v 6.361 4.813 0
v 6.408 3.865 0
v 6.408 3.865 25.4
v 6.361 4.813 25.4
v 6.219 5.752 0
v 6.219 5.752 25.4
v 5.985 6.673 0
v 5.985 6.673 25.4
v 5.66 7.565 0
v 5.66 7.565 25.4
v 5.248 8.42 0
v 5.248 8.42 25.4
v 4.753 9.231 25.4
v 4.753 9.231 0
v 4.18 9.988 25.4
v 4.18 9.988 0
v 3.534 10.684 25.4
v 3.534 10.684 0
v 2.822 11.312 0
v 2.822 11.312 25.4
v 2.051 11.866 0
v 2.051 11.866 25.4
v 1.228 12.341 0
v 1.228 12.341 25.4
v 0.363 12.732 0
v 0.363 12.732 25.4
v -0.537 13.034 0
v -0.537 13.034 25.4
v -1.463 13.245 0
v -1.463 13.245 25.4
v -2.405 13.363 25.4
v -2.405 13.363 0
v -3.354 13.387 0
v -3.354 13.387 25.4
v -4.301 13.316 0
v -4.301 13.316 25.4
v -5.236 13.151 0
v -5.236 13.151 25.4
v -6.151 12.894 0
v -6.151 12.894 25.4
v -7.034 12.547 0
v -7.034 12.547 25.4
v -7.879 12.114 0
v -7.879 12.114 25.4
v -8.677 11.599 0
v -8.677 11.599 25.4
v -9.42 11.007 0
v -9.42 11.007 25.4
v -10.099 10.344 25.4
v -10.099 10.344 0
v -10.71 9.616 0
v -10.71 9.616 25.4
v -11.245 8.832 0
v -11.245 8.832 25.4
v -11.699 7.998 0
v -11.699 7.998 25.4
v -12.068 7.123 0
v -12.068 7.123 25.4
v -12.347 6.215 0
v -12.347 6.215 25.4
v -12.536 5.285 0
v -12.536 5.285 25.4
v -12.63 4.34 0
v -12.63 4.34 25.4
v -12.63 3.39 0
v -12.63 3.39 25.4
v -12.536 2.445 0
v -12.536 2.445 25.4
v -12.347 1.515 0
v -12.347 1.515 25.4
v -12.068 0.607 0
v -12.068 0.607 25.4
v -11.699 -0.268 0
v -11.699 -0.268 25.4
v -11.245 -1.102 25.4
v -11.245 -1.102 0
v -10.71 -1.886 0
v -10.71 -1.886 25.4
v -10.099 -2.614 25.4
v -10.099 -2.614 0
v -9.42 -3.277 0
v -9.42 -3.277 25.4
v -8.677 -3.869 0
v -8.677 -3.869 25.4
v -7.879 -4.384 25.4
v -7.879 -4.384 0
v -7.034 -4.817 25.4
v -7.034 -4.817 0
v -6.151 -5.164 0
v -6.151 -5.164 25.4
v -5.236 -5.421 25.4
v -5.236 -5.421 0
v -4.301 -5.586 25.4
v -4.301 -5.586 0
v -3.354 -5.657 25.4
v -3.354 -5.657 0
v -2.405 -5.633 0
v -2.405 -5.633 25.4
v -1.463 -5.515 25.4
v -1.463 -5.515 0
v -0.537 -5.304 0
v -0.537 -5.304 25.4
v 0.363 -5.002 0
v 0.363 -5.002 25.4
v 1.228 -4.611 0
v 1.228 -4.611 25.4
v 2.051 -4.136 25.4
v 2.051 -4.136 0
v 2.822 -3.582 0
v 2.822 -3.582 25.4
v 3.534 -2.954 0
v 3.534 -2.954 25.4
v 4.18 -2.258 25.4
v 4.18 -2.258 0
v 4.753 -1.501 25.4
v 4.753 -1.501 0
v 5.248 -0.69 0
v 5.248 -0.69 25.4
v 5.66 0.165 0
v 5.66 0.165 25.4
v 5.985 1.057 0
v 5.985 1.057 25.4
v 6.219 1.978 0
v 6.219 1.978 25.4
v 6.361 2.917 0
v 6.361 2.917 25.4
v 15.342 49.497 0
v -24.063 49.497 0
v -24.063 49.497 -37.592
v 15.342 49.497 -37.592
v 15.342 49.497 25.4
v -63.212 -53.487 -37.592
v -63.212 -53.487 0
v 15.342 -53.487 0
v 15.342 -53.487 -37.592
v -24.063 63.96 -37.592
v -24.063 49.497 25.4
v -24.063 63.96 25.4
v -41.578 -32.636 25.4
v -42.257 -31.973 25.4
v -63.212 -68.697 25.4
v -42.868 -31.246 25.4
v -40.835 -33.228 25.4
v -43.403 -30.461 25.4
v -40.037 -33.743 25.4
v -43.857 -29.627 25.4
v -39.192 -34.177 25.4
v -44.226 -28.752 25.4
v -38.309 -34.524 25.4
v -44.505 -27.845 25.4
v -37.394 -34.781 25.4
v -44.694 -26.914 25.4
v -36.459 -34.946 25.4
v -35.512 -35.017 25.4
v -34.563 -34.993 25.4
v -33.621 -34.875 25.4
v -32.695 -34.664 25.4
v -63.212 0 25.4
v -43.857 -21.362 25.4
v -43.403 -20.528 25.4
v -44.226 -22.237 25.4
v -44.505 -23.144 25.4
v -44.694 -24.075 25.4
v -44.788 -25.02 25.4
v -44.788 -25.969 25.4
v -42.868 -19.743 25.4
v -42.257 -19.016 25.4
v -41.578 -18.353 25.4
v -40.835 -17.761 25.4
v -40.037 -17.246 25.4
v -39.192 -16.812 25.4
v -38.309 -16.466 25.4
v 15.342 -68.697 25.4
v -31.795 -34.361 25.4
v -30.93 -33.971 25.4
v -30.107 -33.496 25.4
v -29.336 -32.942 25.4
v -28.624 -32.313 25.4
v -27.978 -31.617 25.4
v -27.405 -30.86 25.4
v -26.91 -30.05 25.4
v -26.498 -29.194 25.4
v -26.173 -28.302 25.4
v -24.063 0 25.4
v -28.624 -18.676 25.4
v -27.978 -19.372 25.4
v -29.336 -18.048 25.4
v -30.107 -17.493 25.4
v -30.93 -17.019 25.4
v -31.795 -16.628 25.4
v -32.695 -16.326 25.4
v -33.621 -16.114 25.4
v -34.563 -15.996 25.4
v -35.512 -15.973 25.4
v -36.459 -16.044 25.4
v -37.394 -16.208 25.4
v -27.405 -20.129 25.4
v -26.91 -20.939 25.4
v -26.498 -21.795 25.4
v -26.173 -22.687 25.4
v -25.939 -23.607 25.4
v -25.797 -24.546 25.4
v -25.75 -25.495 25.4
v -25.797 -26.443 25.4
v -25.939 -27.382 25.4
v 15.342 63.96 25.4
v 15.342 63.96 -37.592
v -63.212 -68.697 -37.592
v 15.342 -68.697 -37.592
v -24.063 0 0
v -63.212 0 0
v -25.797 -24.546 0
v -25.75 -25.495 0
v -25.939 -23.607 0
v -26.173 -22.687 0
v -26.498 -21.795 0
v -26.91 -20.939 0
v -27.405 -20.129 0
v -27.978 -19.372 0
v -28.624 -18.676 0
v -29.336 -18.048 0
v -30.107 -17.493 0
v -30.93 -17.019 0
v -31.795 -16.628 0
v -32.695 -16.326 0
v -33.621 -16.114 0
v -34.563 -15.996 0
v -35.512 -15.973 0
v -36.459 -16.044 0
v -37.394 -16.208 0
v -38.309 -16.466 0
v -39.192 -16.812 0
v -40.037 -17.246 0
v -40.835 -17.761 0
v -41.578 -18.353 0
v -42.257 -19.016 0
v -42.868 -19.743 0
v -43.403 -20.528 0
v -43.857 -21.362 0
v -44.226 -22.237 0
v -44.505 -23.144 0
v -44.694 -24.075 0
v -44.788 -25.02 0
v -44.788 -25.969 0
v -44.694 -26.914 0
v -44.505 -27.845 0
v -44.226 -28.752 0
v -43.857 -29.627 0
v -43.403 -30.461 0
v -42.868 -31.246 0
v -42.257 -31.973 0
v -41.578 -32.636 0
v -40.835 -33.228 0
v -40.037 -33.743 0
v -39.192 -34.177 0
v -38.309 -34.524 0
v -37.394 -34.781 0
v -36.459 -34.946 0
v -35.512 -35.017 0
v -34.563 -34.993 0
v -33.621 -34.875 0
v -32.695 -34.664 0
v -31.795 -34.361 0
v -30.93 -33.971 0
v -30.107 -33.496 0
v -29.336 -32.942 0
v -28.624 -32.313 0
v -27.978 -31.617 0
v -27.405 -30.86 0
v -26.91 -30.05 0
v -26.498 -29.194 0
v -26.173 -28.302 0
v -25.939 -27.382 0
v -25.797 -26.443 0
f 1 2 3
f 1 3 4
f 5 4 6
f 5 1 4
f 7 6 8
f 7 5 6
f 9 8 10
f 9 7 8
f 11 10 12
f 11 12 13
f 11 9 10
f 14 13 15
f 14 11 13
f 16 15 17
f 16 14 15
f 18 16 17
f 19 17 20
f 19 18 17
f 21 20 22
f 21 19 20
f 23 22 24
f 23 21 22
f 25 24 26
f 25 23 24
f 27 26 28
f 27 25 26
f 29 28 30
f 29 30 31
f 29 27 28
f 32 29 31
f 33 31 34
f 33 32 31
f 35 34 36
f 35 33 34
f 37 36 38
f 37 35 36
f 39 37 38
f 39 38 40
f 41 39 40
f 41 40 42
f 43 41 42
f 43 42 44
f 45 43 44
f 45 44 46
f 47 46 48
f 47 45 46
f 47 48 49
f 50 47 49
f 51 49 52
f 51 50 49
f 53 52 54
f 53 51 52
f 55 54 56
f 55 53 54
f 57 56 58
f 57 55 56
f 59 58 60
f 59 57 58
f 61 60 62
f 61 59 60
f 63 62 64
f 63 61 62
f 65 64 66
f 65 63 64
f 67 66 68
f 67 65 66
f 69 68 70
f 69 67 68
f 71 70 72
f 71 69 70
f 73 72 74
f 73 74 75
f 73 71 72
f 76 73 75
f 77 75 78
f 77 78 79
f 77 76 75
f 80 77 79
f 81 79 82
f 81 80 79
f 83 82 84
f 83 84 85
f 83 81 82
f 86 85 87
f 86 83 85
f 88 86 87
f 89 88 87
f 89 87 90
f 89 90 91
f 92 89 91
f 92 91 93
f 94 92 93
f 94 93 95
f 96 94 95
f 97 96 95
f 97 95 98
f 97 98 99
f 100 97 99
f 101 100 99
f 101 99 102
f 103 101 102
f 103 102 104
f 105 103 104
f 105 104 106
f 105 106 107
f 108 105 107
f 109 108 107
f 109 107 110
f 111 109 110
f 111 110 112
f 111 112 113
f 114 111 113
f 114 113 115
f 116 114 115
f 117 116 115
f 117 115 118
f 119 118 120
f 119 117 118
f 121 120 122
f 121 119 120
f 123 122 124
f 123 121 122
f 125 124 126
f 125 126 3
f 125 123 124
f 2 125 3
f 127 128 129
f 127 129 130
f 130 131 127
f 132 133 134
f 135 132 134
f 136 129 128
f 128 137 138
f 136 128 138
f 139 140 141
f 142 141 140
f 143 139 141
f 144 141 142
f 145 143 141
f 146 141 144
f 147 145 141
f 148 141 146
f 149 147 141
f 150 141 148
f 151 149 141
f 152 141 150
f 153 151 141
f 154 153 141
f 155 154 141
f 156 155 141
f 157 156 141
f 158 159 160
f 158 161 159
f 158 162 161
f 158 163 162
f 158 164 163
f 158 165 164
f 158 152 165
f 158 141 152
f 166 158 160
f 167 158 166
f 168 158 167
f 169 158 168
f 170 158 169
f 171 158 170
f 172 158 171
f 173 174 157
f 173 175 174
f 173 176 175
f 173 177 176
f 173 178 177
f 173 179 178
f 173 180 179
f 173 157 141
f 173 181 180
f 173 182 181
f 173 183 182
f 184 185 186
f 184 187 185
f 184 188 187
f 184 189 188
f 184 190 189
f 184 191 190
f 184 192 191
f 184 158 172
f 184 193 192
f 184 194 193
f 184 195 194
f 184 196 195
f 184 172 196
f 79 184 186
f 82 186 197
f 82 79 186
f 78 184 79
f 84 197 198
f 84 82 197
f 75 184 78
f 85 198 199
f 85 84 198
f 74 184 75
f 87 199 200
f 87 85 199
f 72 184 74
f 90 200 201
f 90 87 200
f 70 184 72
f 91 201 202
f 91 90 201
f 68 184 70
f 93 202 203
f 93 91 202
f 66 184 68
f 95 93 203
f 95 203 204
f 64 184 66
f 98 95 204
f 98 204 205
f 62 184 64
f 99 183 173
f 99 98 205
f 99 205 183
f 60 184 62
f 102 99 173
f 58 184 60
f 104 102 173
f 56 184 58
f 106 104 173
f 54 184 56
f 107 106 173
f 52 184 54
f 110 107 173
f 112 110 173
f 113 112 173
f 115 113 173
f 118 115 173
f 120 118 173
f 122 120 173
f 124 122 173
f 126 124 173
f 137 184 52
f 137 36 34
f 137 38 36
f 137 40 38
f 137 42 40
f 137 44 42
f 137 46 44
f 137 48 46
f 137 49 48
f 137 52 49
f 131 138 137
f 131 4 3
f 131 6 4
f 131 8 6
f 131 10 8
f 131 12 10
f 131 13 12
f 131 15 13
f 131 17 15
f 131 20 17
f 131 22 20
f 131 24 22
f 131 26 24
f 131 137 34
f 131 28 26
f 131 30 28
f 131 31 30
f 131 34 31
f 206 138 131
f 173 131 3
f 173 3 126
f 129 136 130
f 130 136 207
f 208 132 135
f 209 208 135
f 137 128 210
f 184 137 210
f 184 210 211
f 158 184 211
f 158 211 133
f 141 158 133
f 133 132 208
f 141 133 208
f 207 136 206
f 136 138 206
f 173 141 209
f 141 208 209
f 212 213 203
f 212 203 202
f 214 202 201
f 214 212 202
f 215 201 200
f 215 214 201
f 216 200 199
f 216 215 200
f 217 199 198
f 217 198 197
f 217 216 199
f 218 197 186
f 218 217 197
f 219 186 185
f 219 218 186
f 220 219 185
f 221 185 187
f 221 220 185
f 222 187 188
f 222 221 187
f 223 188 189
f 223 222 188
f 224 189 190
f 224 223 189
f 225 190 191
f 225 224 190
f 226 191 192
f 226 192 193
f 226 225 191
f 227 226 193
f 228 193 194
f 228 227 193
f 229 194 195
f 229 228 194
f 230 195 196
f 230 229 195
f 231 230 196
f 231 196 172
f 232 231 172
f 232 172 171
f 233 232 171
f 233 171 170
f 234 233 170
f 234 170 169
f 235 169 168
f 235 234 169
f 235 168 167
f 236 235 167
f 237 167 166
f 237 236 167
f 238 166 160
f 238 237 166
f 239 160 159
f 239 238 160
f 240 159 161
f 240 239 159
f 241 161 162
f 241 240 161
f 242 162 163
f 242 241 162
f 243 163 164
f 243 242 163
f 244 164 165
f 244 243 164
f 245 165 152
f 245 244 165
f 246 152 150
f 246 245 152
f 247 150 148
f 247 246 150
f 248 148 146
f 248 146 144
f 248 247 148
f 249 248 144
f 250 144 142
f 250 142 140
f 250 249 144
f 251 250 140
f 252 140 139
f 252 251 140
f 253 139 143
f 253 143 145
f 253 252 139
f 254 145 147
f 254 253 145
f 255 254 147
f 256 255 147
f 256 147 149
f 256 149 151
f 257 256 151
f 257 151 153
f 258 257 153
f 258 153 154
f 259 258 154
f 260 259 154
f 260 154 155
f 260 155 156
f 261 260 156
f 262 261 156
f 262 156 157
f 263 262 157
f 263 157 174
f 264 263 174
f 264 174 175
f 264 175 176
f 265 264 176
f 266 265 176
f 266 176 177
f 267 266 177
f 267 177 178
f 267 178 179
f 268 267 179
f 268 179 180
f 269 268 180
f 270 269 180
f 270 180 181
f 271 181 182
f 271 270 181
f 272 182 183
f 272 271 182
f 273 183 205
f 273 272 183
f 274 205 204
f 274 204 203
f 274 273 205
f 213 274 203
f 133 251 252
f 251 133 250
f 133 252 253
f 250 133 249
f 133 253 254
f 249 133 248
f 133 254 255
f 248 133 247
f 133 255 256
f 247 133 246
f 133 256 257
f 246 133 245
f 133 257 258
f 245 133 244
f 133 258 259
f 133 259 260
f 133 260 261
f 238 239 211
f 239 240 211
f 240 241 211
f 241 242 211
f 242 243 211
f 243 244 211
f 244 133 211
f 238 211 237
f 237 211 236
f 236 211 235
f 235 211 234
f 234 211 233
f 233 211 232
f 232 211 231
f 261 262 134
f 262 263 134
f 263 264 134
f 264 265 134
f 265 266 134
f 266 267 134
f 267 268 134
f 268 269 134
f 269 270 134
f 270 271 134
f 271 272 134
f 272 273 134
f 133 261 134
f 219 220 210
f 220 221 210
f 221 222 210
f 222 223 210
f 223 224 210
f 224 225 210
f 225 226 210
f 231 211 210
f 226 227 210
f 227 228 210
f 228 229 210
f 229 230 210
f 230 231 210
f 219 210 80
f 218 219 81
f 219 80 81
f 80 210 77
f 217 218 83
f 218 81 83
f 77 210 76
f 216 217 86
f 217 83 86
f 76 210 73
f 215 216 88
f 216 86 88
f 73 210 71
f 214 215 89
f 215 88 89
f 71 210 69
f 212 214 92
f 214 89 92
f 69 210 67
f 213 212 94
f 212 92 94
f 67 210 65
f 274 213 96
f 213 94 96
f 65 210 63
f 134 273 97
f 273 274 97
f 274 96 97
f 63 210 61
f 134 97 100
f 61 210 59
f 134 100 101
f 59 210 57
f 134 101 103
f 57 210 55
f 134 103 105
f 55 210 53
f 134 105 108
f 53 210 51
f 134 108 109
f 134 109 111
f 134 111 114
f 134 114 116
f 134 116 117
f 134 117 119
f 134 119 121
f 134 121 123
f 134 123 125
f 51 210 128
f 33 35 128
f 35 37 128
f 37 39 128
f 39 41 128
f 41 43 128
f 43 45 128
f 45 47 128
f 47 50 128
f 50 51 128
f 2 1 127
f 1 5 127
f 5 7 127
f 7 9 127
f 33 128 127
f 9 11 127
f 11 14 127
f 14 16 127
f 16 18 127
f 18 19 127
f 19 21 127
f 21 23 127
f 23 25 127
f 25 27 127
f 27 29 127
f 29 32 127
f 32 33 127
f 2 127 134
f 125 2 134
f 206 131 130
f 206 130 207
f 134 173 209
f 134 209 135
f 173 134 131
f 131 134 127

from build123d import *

# Parameters (mm, degrees)
F0_W     = 39.405261
F0_H     = 14.46261
F0_R     = 9.525
F0_W_2   = 78.554068
F0_H_2   = 15.210686
F1_DEPTH = 25.4
F2_DEPTH = 37.592


with BuildPart() as f1:
    # F0 (on Top) → F1 (new body)
    with BuildSketch(Plane.XY):
        with Locations((-4.360169, 56.728363)):
            Rectangle(F0_W, F0_H)
        Polygon((15.342461, 49.497058), (-24.0628, 49.497058), (-24.0628, 0), (-63.211607, 0), (-63.211607, -53.48674), (15.342461, -53.48674), align=None)
        with Locations((-35.274969, -25.494586)):
            Circle(F0_R, mode=Mode.SUBTRACT)
        with Locations((-3.116944, 3.865009)):
            Circle(F0_R, mode=Mode.SUBTRACT)
        with Locations((-23.934573, -61.092083)):
            Rectangle(F0_W_2, F0_H_2)
    extrude(amount=F1_DEPTH)

    # F0 (on Top) → F2 (join)
    with BuildSketch(Plane.XY):
        with Locations((-4.360169, 56.728363)):
            Rectangle(F0_W, F0_H)
        with Locations((-23.934573, -61.092083)):
            Rectangle(F0_W_2, F0_H_2)
    extrude(amount=-F2_DEPTH)


solid = f1.part
